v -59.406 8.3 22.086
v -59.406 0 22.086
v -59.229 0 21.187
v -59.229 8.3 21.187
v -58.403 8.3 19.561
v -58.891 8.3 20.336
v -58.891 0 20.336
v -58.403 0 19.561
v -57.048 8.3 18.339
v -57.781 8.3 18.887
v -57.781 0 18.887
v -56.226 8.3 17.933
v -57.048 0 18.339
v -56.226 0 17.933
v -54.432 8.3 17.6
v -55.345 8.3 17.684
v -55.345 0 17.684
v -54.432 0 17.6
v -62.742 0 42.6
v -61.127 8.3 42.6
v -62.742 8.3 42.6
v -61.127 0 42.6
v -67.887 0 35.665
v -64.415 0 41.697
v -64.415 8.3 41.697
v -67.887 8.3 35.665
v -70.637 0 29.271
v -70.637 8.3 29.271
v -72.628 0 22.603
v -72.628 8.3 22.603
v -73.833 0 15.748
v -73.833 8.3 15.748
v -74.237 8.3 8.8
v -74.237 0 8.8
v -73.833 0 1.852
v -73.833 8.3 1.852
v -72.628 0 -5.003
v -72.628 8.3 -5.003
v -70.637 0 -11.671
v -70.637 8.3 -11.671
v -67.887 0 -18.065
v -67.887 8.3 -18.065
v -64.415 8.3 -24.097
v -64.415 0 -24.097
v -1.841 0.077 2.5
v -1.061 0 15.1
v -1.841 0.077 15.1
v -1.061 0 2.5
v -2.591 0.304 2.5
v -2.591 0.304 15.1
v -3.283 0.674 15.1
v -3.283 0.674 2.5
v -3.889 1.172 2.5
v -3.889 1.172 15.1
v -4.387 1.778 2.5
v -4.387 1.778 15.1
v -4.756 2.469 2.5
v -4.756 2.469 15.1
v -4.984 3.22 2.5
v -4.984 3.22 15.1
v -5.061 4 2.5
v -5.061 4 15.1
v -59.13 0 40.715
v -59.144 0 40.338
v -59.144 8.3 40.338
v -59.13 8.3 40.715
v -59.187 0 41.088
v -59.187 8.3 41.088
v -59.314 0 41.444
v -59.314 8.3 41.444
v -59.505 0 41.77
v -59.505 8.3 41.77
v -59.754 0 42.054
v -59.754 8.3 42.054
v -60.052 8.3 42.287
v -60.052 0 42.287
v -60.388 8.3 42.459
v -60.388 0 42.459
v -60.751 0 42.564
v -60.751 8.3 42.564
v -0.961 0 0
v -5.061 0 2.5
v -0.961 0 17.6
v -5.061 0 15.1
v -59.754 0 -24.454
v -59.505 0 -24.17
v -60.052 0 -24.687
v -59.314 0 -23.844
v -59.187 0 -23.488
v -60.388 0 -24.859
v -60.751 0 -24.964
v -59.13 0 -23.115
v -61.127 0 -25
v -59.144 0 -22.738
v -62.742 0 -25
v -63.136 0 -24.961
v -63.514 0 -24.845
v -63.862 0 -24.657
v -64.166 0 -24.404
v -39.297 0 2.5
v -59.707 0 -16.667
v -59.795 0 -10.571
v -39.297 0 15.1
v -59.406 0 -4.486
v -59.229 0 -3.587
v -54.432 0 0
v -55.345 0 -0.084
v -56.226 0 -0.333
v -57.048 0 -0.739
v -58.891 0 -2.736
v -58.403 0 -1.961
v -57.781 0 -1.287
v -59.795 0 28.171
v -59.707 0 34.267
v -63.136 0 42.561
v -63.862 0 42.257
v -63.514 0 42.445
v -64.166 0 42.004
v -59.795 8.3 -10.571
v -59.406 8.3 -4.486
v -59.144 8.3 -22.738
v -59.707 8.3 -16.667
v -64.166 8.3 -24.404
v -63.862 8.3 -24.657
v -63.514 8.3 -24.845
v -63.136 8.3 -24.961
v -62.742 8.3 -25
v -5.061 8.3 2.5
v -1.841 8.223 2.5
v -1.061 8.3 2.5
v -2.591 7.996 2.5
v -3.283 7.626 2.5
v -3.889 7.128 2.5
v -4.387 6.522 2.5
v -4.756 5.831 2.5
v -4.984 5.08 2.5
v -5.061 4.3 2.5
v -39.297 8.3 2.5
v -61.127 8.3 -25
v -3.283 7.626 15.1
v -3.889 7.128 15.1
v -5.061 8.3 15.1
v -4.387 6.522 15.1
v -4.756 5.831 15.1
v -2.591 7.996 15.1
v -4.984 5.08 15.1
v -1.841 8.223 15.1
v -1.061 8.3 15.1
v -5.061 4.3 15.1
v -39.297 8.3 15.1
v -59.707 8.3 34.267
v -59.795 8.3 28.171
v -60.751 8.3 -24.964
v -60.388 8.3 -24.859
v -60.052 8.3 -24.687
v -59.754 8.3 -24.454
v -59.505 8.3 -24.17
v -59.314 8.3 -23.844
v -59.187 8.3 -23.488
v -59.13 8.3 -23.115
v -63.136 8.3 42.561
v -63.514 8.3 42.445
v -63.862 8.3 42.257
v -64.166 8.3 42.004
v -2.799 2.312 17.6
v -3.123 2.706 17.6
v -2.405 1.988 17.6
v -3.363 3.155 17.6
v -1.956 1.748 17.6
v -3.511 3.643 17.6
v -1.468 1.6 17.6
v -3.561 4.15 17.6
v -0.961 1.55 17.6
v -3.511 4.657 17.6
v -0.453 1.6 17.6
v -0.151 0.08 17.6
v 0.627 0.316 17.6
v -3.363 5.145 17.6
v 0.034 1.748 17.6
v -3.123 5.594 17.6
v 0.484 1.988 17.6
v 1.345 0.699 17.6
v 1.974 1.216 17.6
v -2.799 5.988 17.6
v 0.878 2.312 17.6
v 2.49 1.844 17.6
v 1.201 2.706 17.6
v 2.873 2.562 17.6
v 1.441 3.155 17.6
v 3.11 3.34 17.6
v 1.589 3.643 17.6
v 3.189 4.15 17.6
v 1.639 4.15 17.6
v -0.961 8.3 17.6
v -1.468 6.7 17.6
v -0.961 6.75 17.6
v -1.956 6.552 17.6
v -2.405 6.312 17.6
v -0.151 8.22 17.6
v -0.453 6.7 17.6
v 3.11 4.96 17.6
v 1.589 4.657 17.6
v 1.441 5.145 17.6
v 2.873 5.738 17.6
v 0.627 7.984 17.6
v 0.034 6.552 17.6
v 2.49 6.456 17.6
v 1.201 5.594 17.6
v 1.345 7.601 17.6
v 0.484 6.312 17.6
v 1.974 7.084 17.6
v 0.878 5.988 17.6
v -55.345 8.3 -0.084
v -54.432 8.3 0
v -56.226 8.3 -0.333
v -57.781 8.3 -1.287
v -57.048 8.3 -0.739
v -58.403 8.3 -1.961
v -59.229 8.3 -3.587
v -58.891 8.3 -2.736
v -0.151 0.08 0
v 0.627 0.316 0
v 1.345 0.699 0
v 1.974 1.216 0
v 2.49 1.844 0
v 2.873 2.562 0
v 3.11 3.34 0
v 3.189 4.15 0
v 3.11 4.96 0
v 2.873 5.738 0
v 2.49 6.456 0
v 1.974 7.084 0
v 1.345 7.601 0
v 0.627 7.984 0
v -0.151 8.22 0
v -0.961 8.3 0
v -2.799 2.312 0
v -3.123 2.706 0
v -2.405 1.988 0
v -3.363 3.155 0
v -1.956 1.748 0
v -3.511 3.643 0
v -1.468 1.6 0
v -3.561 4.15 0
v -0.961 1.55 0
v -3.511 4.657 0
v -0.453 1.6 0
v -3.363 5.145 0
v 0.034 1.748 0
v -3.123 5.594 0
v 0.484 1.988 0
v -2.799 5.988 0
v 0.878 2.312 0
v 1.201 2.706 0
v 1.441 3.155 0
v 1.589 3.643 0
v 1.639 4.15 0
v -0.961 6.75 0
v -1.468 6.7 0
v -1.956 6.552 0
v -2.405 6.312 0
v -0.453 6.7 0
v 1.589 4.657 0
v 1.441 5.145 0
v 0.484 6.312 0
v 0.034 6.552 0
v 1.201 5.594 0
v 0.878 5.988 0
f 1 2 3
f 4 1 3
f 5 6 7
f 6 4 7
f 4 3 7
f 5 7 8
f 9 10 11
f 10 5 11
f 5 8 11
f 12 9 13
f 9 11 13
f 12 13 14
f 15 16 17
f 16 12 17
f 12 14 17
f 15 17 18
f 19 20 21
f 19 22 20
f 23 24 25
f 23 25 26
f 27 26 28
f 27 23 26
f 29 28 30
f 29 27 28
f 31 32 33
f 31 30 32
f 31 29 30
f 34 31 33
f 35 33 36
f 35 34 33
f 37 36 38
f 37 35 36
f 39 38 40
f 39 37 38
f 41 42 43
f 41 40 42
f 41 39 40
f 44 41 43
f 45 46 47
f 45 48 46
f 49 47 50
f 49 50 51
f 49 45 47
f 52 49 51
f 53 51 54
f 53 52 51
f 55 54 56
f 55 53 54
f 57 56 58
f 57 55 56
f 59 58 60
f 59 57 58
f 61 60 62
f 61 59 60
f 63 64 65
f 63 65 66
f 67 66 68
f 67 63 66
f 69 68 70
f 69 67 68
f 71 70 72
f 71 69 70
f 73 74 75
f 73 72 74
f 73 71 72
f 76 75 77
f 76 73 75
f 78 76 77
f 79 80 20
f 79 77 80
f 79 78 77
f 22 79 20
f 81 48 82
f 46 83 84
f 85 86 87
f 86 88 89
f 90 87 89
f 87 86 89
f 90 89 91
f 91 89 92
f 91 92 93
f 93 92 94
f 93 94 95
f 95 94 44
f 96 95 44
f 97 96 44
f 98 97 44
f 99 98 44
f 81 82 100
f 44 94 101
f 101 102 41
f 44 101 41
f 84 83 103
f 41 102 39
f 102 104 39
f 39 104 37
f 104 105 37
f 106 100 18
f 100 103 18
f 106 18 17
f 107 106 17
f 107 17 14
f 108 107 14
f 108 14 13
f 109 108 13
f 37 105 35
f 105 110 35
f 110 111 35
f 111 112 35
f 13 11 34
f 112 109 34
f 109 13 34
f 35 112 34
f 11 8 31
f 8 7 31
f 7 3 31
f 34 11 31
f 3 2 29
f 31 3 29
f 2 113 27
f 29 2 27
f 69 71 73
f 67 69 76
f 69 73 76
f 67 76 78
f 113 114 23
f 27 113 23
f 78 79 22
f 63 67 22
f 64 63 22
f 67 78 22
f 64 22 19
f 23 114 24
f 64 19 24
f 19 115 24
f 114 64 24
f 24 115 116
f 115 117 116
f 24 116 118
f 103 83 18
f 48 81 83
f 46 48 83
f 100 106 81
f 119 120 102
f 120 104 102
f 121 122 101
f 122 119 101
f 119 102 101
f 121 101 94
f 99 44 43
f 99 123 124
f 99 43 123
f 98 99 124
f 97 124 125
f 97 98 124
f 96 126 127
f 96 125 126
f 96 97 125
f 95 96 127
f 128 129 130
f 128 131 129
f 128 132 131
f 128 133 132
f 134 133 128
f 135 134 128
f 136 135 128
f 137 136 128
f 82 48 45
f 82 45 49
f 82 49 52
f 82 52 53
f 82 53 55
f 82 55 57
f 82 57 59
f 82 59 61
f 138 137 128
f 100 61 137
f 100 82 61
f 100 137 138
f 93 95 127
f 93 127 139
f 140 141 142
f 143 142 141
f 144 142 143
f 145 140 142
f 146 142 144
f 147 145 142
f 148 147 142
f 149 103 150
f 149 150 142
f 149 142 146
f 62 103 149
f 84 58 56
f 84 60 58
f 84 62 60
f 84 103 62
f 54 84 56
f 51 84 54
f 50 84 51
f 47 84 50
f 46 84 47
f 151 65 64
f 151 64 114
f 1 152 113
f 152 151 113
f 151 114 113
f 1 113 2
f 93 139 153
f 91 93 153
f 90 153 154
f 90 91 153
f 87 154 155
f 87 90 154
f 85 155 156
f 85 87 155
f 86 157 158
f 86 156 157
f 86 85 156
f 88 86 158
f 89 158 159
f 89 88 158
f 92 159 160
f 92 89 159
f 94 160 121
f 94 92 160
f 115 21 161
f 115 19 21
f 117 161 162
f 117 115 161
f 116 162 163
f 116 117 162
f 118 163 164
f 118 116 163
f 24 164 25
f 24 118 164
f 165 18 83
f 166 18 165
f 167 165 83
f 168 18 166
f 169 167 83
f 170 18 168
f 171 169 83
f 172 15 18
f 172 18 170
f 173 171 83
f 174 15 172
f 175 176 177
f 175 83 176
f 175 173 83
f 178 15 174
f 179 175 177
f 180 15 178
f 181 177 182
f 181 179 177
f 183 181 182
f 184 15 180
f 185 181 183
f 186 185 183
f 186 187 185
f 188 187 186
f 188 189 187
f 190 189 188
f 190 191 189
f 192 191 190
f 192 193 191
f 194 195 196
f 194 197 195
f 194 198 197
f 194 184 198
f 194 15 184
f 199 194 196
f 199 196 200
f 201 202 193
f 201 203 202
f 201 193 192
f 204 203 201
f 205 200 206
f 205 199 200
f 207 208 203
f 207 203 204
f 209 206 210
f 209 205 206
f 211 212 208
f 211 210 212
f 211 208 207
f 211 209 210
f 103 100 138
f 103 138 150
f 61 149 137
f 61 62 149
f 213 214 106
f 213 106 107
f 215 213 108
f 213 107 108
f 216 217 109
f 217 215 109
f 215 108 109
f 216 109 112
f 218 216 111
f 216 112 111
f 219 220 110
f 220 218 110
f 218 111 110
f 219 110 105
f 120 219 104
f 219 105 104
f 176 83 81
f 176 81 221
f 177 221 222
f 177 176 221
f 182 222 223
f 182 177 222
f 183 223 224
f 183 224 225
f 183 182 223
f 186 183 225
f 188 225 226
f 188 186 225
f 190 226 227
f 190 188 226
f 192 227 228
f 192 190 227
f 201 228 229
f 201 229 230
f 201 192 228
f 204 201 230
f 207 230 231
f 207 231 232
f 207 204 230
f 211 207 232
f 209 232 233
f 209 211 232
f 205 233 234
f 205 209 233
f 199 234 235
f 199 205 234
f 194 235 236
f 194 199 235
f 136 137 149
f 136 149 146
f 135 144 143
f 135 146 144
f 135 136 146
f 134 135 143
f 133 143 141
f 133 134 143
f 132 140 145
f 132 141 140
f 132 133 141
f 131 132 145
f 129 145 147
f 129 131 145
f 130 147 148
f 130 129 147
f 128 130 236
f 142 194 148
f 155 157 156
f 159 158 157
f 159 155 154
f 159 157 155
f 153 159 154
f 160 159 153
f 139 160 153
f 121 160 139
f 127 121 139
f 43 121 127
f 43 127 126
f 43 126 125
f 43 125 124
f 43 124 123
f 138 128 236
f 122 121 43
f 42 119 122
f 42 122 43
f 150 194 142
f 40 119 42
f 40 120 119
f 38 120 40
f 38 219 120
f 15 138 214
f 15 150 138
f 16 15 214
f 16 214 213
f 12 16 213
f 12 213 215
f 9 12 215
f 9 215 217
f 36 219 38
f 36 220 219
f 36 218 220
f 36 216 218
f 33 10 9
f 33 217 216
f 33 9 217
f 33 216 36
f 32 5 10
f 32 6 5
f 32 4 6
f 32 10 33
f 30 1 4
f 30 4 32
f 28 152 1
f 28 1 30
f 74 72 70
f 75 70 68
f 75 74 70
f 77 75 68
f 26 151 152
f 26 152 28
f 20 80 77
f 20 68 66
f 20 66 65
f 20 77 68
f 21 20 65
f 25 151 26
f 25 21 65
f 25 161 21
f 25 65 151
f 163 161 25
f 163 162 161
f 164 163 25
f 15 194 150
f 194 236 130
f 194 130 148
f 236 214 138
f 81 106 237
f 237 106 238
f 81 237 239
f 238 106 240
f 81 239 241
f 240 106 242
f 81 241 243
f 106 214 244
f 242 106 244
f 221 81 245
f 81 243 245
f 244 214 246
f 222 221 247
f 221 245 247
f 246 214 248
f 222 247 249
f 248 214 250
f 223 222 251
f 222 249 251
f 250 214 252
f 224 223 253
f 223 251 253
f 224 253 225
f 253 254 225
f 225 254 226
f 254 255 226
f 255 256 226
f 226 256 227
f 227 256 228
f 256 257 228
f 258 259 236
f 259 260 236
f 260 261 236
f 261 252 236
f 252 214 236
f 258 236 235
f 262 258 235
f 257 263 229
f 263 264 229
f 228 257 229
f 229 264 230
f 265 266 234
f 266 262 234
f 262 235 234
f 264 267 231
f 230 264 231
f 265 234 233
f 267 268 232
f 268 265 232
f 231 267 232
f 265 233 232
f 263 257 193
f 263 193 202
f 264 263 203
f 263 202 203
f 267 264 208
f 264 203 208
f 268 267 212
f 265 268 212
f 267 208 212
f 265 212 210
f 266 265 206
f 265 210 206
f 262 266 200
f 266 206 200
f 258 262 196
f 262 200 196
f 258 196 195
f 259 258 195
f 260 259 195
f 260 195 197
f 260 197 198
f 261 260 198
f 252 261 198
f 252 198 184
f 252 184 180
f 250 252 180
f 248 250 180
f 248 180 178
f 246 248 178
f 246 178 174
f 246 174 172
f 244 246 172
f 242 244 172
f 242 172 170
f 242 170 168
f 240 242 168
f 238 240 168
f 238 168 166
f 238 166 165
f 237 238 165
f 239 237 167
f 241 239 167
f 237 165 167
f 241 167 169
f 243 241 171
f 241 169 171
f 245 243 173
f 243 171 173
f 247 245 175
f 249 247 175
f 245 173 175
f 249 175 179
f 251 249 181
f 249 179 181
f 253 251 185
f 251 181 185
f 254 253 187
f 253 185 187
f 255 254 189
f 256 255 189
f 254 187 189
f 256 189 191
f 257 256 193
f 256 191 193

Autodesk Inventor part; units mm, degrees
ref_plane "YZ Plane" through (0, 0, 0) normal (1, 0, 0) x (0, 1, 0)
ref_plane "XZ Plane" through (0, 0, 0) normal (0, 1, 0) x (-1, 0, 0)
ref_plane "XY Plane" through (0, 0, 0) normal (0, 0, 1) x (1, 0, 0)
sketch "Sketch1" plane through (0, 0, 0) normal (0, 1, 0) x (-1, 0, 0)
  circle A0 centre (45.6085, 8.8) radius 5.405
  line L0 (3.774, 0.6) -> (39.2972, 0.6)
  line L1 (3.774, 17) -> (3.774, 0.6)
  line L2 (39.2972, 17) -> (3.774, 17)
  line L3 (39.2972, 0.6) -> (39.2972, 17)
  arc A1 (64.4148, -24.0966) -> (64.4148, 41.6966) centre (14.2369, 8.8) ccw
  line L4 (61.1267, 42.6) -> (62.7422, 42.6)
  line L5 (5.5105, 17.6) -> (54.4325, 17.6)
  line L6 (54.4325, 0) -> (5.5105, 0)
  line L7 (62.7422, -25) -> (61.1267, -25)
  line L8 (-3.1893, 17.6) -> (-3.1893, 0)
  line L9 (54.4325, 0) -> (-3.1893, 0)
  line L10 (-3.1893, 17.6) -> (58.8107, 17.6)
  arc A2 (59.144, -22.7375) -> (59.406, -4.4863) centre (-18.1812, -12.5) ccw
  arc A3 (59.406, 22.0863) -> (59.144, 40.3375) centre (-18.1812, 30.1) ccw
  arc A4 (59.406, -4.4863) -> (54.4325, 0) centre (54.4325, -5) ccw
  arc A5 (54.4325, 17.6) -> (59.406, 22.0863) centre (54.4325, 22.6) ccw
  arc A6 (62.7422, -25) -> (64.4148, -24.0966) centre (62.7422, -23) ccw
  arc A7 (59.144, -22.7375) -> (61.1267, -25) centre (61.1267, -23) ccw
  arc A8 (61.1267, 42.6) -> (59.144, 40.3375) centre (61.1267, 40.6) ccw
  arc A9 (64.4148, 41.6966) -> (62.7422, 42.6) centre (62.7422, 40.6) ccw
  point P0 (0, 0)
  point P1 (17.5306, 8.8)
  point P2 (63.8107, -25)
  point P3 (63.8107, 42.6)
  dimension "d0" = 17.6
  dimension "d1" = 62
  dimension "d2" = 78
  dimension "d3" = 78
  dimension "d4" = 5
  dimension "d5" = 2
extrude "Extrusion1" add sketch "Sketch1" along normal blind 8.3 contours A0 | L1 L2 L3 L0 | A6 L7 A7 A2 A4 L6 L9 L8 L10 L5 A5 A3 A8 L4 A9 A1
sketch "Sketch2" plane through (-54.4325, 0, 17.6) normal (0, 0, 1) x (1, 0, 0)
  line L0 (0, 0) -> (57.6218, 0) construction
  line L1 (57.6218, 0) -> (57.6218, 8.3)
  line L2 (0, 8.3) -> (57.6218, 8.3)
  line L3 (0, 0) -> (0, 8.3) construction
  line L4 (57.6218, 0) -> (57.6218, 8.3) construction
  line L5 (57.6218, 4.15) -> (52.9259, 4.15) construction
  circle A0 centre (53.4718, 4.15) radius 4.15
  circle A1 centre (53.4718, 4.15) radius 2.6
  line L6 (0, 8.3) -> (57.6218, 8.3) projected
  line L7 (57.6218, 0) -> (57.6218, 8.3) construction
  line L8 (0, 0) -> (57.6218, 0) construction
  line L9 (53.4718, 8.3) -> (57.6218, 8.3)
  line L10 (57.6218, 0) -> (57.6218, 8.3)
  line L11 (53.4718, 0) -> (57.6218, 0)
  point P0 (54.4325, 0)
  dimension "d8" = 1.55
extrude "Extrusion2" cut sketch "Sketch2" against normal through all
sketch "Sketch3" plane through (-54.4325, 0, 17.6) normal (0, 0, 1) x (1, 0, 0)
  circle A0 centre (53.4718, 4.15) radius 2.6 construction
  arc A1 (53.4718, 8.3) -> (53.4718, 0) centre (53.4718, 4.15) ccw construction
  circle A2 centre (53.4718, 4.15) radius 4.15
  point P0 (54.4325, 0)
extrude "Extrusion3" add sketch "Sketch3" against normal up to surface (17.6 mm away)
sketch "Sketch4" plane through (-54.4325, 0, 17.6) normal (0, 0, 1) x (1, 0, 0)
  circle A0 centre (53.4718, 4.15) radius 2.6 projected
  point P0 (54.4325, 0)
extrude "Extrusion4" cut sketch "Sketch4" against normal through all
sketch "Sketch5" plane through (-54.4325, 0, 17.6) normal (0, 0, 1) x (1, 0, 0)
  point P0 (54.4325, 0)
sketch "Sketch6" plane through (0, 0, 0) normal (0, -1, 0) x (1, 0, 0)
  line L0 (-39.2972, 17) -> (-3.774, 17) projected
  line L1 (-39.2972, 0.6) -> (-39.2972, 17) projected
  line L2 (-3.774, 0.6) -> (-39.2972, 0.6) projected
  line L3 (-3.774, 17) -> (-3.774, 0.6) projected
  line L4 (-54.4325, 17.6) -> (-0.9607, 17.6) construction
  line L5 (-29.8249, 17.6) -> (-29.8249, 15.1) construction
  line L6 (-3.774, 14.6) -> (-3.774, 3)
  line L7 (-39.2972, 3) -> (-39.2972, 14.6)
  line L8 (-25.5022, 0) -> (-25.5022, 2.5)
  line L9 (-3.5607, 17.6) -> (-3.5607, 0) construction
  line L10 (-3.5607, 7.6434) -> (-5.0607, 7.6434) construction
  line L11 (-39.2972, 15.1) -> (-5.0607, 15.1)
  line L12 (-5.0607, 15.1) -> (-5.0607, 2.5)
  line L13 (-5.0607, 2.5) -> (-39.2972, 2.5)
  line L14 (-39.2972, 2.5) -> (-39.2972, 15.1)
  point P0 (0, 0)
  dimension "d15" = 2.5
  dimension "d16" = 11.6
  dimension "d19" = 2.5
  dimension "d20" = 1.5
extrude "Extrusion5" cut sketch "Sketch6" against normal blind 8.3 contours L11 L12 L13 L1
fillet "Fillet1" radius 4 2 edges at (-5.0607, 0, 8.8) (-5.0607, 8.3, 8.8)
properties part number "lever2"
